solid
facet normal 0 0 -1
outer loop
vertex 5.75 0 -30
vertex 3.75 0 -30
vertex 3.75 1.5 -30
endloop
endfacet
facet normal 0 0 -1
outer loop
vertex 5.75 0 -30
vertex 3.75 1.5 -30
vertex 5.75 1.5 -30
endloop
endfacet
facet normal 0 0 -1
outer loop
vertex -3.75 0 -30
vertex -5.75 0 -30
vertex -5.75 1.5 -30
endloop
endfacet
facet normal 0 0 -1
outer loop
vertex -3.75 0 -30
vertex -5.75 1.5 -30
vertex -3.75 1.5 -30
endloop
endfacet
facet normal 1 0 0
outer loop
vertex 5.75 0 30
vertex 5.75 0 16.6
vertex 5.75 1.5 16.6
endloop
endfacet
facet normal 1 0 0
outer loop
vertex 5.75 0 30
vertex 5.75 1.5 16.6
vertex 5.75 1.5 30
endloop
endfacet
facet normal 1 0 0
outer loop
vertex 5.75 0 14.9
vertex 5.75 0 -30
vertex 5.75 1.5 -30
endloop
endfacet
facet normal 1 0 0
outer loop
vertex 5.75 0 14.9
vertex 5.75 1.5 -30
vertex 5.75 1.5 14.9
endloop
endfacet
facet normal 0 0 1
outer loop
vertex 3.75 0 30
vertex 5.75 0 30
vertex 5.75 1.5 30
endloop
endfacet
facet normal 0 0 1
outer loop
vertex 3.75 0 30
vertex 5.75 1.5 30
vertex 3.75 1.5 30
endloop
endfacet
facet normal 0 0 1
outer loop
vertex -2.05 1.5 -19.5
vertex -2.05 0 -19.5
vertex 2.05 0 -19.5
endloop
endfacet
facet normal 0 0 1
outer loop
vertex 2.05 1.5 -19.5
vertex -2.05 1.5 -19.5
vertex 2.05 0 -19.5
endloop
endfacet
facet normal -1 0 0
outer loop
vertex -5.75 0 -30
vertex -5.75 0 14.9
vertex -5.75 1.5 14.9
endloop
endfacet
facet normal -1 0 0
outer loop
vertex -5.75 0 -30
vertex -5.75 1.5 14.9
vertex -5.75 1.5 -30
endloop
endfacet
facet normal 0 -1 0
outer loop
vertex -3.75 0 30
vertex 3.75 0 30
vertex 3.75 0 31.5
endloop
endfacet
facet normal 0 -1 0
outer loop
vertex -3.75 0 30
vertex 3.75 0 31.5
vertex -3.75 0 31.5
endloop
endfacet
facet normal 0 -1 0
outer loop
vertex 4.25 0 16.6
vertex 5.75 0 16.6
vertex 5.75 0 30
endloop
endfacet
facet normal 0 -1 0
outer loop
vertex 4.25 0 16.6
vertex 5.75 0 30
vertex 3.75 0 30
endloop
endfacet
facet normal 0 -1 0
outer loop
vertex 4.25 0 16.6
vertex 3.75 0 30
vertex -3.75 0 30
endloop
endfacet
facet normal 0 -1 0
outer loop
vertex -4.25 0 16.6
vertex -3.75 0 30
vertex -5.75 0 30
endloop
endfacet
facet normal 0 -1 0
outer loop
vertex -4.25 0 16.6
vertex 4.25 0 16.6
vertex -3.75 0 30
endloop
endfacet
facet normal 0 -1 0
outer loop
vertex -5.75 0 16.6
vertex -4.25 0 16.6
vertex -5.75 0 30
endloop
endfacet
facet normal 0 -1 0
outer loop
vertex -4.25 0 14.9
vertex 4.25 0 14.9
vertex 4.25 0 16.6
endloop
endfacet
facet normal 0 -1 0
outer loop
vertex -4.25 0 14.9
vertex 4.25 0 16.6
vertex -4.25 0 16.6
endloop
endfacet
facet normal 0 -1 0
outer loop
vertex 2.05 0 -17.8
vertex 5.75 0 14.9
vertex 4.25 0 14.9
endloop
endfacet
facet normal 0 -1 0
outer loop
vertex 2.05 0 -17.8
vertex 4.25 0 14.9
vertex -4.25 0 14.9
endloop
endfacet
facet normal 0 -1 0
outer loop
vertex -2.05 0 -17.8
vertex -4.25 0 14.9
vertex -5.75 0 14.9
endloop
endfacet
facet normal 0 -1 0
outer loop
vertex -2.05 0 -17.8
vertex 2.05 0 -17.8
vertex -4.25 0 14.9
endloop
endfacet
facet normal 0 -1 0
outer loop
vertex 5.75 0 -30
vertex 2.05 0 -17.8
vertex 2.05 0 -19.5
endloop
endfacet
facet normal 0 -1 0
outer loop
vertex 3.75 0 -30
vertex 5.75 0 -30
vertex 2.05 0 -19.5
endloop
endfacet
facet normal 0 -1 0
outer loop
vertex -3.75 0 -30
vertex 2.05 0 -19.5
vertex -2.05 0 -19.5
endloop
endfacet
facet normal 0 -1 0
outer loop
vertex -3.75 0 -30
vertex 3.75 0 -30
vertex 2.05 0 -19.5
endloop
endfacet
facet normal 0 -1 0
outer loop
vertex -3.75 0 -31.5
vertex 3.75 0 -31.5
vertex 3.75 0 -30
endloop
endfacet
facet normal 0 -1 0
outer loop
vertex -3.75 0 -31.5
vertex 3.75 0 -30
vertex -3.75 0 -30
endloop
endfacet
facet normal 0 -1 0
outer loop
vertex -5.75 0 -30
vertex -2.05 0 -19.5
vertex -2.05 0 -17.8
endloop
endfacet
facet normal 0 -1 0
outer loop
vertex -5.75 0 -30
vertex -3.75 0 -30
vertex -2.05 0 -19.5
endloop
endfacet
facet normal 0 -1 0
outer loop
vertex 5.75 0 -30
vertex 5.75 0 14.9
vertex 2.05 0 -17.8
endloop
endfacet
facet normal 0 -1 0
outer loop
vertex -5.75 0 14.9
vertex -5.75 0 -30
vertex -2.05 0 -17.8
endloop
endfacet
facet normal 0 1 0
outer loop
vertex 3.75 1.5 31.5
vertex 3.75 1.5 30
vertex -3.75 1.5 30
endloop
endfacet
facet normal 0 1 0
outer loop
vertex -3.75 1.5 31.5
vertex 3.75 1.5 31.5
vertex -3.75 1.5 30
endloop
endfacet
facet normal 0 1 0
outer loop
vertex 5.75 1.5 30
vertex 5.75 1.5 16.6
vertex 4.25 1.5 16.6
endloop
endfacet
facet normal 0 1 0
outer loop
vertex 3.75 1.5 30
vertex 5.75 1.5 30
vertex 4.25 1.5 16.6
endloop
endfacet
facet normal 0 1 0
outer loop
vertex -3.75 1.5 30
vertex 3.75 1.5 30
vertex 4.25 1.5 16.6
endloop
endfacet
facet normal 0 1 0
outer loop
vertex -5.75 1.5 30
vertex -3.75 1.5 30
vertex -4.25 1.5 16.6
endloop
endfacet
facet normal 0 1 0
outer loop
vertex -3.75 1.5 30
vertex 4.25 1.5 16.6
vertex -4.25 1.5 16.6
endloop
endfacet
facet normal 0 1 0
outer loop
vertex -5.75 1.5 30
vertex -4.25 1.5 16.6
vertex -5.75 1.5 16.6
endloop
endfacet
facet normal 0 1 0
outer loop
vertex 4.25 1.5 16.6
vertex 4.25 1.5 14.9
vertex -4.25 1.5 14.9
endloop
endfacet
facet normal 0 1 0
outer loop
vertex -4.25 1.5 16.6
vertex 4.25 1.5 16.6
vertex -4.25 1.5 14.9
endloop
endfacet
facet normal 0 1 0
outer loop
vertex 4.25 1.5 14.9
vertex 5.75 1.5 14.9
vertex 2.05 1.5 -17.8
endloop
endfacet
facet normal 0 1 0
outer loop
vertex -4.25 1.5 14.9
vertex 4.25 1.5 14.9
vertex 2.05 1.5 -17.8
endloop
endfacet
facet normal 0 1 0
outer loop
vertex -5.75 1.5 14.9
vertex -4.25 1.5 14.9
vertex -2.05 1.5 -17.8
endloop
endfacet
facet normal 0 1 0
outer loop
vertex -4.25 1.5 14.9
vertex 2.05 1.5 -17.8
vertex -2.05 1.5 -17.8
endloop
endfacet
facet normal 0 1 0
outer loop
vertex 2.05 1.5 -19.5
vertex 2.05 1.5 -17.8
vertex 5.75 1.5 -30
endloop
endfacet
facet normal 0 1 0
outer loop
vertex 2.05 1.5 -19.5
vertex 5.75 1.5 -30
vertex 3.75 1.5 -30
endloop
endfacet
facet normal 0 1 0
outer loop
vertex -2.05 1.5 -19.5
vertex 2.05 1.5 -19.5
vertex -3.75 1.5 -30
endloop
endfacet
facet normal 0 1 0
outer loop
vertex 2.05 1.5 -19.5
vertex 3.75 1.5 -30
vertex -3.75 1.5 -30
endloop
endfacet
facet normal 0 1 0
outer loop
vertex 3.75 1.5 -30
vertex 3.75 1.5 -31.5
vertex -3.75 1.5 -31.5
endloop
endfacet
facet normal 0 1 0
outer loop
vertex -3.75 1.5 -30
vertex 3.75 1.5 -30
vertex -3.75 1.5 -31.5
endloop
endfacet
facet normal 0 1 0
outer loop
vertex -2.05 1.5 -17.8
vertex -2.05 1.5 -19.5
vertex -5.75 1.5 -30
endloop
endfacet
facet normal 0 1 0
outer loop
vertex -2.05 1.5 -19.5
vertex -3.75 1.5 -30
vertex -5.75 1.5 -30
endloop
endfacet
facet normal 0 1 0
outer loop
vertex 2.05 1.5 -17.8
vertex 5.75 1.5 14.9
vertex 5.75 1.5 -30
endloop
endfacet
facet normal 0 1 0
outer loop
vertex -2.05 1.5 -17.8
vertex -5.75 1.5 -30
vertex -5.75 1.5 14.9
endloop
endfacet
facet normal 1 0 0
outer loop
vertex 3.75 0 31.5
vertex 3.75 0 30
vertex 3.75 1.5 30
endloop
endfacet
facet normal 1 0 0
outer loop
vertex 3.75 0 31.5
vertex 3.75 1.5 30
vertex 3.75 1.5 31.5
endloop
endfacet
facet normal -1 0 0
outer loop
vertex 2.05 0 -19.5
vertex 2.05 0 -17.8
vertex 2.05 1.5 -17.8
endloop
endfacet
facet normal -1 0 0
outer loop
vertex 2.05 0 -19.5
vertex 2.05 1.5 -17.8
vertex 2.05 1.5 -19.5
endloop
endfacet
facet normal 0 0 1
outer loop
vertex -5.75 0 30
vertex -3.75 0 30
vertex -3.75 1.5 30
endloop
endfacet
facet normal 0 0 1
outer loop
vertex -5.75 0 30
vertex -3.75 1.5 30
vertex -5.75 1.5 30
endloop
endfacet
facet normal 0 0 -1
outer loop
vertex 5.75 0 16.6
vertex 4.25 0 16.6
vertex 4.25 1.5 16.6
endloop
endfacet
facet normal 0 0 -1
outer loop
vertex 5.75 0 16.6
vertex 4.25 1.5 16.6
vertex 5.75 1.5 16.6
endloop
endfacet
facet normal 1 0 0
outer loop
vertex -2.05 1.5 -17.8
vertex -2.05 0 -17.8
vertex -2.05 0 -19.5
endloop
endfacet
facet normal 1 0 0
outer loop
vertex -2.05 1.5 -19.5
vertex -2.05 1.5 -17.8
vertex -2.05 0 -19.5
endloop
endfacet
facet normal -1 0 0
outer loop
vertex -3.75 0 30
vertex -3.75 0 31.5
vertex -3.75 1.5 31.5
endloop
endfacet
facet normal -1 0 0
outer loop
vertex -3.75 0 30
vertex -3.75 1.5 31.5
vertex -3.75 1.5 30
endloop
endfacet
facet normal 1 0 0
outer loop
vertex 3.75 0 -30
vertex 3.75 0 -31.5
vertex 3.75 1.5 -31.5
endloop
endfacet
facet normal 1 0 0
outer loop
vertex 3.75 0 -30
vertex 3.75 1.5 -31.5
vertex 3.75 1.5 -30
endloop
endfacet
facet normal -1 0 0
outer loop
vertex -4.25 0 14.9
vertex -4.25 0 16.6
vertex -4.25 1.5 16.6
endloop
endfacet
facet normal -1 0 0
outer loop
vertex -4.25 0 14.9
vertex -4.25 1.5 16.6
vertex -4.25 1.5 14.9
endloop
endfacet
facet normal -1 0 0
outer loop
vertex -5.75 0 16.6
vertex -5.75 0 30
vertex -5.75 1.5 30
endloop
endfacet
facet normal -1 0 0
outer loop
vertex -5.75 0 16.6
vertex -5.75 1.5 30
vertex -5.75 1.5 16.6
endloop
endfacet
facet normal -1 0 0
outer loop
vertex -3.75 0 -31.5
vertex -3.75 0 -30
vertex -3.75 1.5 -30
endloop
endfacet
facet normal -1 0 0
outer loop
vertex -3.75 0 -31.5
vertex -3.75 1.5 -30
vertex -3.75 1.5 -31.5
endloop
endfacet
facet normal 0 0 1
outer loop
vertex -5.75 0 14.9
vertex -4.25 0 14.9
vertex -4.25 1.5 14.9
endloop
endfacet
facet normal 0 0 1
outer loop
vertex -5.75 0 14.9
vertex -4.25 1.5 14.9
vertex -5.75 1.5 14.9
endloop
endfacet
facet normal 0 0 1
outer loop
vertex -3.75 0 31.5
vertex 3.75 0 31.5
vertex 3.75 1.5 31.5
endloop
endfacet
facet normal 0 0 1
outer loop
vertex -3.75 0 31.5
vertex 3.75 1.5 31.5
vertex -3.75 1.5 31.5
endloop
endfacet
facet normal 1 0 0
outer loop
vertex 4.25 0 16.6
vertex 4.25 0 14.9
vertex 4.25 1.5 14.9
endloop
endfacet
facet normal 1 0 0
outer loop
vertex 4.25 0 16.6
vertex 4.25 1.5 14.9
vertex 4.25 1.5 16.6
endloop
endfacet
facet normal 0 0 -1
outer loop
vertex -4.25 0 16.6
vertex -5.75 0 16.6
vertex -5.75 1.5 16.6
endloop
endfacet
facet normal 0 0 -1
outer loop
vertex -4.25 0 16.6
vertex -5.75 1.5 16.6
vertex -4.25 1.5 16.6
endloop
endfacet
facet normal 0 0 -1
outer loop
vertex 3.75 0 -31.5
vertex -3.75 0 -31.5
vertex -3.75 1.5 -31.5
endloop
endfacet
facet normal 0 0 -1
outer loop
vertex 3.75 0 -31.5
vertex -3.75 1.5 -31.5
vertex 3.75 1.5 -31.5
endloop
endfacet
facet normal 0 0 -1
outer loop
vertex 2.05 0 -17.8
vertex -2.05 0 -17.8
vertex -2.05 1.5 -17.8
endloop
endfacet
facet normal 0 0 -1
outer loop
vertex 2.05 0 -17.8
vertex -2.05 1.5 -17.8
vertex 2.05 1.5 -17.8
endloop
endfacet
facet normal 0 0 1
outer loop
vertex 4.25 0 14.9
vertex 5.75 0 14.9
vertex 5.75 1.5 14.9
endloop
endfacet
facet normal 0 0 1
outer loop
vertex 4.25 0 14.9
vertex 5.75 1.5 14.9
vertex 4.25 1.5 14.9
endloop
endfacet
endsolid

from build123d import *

# Parameters (mm, degrees)
SKETCH1_W           = 4.1
SKETCH1_H           = 1.7
BOSS_EXTRUDE1_DEPTH = 1.5


with BuildPart() as part:
    # Sketch1 → Boss-Extrude1 (new body)
    with BuildSketch(Plane(origin=(0, 0, 0), x_dir=(1, 0, 0), z_dir=(0, 1, 0))):
        Polygon((3.75, 30), (5.75, 30), (5.75, -14.9), (4.25, -14.9), (4.25, -16.6), (5.75, -16.6), (5.75, -30), (3.75, -30), (3.75, -31.5), (-3.75, -31.5), (-3.75, -30), (-5.75, -30), (-5.75, -16.6), (-4.25, -16.6), (-4.25, -14.9), (-5.75, -14.9), (-5.75, 30), (-3.75, 30), (-3.75, 31.5), (3.75, 31.5), align=None)
        with Locations((0, 18.65)):
            Rectangle(SKETCH1_W, SKETCH1_H, mode=Mode.SUBTRACT)
    extrude(amount=BOSS_EXTRUDE1_DEPTH)


solid = part.part
